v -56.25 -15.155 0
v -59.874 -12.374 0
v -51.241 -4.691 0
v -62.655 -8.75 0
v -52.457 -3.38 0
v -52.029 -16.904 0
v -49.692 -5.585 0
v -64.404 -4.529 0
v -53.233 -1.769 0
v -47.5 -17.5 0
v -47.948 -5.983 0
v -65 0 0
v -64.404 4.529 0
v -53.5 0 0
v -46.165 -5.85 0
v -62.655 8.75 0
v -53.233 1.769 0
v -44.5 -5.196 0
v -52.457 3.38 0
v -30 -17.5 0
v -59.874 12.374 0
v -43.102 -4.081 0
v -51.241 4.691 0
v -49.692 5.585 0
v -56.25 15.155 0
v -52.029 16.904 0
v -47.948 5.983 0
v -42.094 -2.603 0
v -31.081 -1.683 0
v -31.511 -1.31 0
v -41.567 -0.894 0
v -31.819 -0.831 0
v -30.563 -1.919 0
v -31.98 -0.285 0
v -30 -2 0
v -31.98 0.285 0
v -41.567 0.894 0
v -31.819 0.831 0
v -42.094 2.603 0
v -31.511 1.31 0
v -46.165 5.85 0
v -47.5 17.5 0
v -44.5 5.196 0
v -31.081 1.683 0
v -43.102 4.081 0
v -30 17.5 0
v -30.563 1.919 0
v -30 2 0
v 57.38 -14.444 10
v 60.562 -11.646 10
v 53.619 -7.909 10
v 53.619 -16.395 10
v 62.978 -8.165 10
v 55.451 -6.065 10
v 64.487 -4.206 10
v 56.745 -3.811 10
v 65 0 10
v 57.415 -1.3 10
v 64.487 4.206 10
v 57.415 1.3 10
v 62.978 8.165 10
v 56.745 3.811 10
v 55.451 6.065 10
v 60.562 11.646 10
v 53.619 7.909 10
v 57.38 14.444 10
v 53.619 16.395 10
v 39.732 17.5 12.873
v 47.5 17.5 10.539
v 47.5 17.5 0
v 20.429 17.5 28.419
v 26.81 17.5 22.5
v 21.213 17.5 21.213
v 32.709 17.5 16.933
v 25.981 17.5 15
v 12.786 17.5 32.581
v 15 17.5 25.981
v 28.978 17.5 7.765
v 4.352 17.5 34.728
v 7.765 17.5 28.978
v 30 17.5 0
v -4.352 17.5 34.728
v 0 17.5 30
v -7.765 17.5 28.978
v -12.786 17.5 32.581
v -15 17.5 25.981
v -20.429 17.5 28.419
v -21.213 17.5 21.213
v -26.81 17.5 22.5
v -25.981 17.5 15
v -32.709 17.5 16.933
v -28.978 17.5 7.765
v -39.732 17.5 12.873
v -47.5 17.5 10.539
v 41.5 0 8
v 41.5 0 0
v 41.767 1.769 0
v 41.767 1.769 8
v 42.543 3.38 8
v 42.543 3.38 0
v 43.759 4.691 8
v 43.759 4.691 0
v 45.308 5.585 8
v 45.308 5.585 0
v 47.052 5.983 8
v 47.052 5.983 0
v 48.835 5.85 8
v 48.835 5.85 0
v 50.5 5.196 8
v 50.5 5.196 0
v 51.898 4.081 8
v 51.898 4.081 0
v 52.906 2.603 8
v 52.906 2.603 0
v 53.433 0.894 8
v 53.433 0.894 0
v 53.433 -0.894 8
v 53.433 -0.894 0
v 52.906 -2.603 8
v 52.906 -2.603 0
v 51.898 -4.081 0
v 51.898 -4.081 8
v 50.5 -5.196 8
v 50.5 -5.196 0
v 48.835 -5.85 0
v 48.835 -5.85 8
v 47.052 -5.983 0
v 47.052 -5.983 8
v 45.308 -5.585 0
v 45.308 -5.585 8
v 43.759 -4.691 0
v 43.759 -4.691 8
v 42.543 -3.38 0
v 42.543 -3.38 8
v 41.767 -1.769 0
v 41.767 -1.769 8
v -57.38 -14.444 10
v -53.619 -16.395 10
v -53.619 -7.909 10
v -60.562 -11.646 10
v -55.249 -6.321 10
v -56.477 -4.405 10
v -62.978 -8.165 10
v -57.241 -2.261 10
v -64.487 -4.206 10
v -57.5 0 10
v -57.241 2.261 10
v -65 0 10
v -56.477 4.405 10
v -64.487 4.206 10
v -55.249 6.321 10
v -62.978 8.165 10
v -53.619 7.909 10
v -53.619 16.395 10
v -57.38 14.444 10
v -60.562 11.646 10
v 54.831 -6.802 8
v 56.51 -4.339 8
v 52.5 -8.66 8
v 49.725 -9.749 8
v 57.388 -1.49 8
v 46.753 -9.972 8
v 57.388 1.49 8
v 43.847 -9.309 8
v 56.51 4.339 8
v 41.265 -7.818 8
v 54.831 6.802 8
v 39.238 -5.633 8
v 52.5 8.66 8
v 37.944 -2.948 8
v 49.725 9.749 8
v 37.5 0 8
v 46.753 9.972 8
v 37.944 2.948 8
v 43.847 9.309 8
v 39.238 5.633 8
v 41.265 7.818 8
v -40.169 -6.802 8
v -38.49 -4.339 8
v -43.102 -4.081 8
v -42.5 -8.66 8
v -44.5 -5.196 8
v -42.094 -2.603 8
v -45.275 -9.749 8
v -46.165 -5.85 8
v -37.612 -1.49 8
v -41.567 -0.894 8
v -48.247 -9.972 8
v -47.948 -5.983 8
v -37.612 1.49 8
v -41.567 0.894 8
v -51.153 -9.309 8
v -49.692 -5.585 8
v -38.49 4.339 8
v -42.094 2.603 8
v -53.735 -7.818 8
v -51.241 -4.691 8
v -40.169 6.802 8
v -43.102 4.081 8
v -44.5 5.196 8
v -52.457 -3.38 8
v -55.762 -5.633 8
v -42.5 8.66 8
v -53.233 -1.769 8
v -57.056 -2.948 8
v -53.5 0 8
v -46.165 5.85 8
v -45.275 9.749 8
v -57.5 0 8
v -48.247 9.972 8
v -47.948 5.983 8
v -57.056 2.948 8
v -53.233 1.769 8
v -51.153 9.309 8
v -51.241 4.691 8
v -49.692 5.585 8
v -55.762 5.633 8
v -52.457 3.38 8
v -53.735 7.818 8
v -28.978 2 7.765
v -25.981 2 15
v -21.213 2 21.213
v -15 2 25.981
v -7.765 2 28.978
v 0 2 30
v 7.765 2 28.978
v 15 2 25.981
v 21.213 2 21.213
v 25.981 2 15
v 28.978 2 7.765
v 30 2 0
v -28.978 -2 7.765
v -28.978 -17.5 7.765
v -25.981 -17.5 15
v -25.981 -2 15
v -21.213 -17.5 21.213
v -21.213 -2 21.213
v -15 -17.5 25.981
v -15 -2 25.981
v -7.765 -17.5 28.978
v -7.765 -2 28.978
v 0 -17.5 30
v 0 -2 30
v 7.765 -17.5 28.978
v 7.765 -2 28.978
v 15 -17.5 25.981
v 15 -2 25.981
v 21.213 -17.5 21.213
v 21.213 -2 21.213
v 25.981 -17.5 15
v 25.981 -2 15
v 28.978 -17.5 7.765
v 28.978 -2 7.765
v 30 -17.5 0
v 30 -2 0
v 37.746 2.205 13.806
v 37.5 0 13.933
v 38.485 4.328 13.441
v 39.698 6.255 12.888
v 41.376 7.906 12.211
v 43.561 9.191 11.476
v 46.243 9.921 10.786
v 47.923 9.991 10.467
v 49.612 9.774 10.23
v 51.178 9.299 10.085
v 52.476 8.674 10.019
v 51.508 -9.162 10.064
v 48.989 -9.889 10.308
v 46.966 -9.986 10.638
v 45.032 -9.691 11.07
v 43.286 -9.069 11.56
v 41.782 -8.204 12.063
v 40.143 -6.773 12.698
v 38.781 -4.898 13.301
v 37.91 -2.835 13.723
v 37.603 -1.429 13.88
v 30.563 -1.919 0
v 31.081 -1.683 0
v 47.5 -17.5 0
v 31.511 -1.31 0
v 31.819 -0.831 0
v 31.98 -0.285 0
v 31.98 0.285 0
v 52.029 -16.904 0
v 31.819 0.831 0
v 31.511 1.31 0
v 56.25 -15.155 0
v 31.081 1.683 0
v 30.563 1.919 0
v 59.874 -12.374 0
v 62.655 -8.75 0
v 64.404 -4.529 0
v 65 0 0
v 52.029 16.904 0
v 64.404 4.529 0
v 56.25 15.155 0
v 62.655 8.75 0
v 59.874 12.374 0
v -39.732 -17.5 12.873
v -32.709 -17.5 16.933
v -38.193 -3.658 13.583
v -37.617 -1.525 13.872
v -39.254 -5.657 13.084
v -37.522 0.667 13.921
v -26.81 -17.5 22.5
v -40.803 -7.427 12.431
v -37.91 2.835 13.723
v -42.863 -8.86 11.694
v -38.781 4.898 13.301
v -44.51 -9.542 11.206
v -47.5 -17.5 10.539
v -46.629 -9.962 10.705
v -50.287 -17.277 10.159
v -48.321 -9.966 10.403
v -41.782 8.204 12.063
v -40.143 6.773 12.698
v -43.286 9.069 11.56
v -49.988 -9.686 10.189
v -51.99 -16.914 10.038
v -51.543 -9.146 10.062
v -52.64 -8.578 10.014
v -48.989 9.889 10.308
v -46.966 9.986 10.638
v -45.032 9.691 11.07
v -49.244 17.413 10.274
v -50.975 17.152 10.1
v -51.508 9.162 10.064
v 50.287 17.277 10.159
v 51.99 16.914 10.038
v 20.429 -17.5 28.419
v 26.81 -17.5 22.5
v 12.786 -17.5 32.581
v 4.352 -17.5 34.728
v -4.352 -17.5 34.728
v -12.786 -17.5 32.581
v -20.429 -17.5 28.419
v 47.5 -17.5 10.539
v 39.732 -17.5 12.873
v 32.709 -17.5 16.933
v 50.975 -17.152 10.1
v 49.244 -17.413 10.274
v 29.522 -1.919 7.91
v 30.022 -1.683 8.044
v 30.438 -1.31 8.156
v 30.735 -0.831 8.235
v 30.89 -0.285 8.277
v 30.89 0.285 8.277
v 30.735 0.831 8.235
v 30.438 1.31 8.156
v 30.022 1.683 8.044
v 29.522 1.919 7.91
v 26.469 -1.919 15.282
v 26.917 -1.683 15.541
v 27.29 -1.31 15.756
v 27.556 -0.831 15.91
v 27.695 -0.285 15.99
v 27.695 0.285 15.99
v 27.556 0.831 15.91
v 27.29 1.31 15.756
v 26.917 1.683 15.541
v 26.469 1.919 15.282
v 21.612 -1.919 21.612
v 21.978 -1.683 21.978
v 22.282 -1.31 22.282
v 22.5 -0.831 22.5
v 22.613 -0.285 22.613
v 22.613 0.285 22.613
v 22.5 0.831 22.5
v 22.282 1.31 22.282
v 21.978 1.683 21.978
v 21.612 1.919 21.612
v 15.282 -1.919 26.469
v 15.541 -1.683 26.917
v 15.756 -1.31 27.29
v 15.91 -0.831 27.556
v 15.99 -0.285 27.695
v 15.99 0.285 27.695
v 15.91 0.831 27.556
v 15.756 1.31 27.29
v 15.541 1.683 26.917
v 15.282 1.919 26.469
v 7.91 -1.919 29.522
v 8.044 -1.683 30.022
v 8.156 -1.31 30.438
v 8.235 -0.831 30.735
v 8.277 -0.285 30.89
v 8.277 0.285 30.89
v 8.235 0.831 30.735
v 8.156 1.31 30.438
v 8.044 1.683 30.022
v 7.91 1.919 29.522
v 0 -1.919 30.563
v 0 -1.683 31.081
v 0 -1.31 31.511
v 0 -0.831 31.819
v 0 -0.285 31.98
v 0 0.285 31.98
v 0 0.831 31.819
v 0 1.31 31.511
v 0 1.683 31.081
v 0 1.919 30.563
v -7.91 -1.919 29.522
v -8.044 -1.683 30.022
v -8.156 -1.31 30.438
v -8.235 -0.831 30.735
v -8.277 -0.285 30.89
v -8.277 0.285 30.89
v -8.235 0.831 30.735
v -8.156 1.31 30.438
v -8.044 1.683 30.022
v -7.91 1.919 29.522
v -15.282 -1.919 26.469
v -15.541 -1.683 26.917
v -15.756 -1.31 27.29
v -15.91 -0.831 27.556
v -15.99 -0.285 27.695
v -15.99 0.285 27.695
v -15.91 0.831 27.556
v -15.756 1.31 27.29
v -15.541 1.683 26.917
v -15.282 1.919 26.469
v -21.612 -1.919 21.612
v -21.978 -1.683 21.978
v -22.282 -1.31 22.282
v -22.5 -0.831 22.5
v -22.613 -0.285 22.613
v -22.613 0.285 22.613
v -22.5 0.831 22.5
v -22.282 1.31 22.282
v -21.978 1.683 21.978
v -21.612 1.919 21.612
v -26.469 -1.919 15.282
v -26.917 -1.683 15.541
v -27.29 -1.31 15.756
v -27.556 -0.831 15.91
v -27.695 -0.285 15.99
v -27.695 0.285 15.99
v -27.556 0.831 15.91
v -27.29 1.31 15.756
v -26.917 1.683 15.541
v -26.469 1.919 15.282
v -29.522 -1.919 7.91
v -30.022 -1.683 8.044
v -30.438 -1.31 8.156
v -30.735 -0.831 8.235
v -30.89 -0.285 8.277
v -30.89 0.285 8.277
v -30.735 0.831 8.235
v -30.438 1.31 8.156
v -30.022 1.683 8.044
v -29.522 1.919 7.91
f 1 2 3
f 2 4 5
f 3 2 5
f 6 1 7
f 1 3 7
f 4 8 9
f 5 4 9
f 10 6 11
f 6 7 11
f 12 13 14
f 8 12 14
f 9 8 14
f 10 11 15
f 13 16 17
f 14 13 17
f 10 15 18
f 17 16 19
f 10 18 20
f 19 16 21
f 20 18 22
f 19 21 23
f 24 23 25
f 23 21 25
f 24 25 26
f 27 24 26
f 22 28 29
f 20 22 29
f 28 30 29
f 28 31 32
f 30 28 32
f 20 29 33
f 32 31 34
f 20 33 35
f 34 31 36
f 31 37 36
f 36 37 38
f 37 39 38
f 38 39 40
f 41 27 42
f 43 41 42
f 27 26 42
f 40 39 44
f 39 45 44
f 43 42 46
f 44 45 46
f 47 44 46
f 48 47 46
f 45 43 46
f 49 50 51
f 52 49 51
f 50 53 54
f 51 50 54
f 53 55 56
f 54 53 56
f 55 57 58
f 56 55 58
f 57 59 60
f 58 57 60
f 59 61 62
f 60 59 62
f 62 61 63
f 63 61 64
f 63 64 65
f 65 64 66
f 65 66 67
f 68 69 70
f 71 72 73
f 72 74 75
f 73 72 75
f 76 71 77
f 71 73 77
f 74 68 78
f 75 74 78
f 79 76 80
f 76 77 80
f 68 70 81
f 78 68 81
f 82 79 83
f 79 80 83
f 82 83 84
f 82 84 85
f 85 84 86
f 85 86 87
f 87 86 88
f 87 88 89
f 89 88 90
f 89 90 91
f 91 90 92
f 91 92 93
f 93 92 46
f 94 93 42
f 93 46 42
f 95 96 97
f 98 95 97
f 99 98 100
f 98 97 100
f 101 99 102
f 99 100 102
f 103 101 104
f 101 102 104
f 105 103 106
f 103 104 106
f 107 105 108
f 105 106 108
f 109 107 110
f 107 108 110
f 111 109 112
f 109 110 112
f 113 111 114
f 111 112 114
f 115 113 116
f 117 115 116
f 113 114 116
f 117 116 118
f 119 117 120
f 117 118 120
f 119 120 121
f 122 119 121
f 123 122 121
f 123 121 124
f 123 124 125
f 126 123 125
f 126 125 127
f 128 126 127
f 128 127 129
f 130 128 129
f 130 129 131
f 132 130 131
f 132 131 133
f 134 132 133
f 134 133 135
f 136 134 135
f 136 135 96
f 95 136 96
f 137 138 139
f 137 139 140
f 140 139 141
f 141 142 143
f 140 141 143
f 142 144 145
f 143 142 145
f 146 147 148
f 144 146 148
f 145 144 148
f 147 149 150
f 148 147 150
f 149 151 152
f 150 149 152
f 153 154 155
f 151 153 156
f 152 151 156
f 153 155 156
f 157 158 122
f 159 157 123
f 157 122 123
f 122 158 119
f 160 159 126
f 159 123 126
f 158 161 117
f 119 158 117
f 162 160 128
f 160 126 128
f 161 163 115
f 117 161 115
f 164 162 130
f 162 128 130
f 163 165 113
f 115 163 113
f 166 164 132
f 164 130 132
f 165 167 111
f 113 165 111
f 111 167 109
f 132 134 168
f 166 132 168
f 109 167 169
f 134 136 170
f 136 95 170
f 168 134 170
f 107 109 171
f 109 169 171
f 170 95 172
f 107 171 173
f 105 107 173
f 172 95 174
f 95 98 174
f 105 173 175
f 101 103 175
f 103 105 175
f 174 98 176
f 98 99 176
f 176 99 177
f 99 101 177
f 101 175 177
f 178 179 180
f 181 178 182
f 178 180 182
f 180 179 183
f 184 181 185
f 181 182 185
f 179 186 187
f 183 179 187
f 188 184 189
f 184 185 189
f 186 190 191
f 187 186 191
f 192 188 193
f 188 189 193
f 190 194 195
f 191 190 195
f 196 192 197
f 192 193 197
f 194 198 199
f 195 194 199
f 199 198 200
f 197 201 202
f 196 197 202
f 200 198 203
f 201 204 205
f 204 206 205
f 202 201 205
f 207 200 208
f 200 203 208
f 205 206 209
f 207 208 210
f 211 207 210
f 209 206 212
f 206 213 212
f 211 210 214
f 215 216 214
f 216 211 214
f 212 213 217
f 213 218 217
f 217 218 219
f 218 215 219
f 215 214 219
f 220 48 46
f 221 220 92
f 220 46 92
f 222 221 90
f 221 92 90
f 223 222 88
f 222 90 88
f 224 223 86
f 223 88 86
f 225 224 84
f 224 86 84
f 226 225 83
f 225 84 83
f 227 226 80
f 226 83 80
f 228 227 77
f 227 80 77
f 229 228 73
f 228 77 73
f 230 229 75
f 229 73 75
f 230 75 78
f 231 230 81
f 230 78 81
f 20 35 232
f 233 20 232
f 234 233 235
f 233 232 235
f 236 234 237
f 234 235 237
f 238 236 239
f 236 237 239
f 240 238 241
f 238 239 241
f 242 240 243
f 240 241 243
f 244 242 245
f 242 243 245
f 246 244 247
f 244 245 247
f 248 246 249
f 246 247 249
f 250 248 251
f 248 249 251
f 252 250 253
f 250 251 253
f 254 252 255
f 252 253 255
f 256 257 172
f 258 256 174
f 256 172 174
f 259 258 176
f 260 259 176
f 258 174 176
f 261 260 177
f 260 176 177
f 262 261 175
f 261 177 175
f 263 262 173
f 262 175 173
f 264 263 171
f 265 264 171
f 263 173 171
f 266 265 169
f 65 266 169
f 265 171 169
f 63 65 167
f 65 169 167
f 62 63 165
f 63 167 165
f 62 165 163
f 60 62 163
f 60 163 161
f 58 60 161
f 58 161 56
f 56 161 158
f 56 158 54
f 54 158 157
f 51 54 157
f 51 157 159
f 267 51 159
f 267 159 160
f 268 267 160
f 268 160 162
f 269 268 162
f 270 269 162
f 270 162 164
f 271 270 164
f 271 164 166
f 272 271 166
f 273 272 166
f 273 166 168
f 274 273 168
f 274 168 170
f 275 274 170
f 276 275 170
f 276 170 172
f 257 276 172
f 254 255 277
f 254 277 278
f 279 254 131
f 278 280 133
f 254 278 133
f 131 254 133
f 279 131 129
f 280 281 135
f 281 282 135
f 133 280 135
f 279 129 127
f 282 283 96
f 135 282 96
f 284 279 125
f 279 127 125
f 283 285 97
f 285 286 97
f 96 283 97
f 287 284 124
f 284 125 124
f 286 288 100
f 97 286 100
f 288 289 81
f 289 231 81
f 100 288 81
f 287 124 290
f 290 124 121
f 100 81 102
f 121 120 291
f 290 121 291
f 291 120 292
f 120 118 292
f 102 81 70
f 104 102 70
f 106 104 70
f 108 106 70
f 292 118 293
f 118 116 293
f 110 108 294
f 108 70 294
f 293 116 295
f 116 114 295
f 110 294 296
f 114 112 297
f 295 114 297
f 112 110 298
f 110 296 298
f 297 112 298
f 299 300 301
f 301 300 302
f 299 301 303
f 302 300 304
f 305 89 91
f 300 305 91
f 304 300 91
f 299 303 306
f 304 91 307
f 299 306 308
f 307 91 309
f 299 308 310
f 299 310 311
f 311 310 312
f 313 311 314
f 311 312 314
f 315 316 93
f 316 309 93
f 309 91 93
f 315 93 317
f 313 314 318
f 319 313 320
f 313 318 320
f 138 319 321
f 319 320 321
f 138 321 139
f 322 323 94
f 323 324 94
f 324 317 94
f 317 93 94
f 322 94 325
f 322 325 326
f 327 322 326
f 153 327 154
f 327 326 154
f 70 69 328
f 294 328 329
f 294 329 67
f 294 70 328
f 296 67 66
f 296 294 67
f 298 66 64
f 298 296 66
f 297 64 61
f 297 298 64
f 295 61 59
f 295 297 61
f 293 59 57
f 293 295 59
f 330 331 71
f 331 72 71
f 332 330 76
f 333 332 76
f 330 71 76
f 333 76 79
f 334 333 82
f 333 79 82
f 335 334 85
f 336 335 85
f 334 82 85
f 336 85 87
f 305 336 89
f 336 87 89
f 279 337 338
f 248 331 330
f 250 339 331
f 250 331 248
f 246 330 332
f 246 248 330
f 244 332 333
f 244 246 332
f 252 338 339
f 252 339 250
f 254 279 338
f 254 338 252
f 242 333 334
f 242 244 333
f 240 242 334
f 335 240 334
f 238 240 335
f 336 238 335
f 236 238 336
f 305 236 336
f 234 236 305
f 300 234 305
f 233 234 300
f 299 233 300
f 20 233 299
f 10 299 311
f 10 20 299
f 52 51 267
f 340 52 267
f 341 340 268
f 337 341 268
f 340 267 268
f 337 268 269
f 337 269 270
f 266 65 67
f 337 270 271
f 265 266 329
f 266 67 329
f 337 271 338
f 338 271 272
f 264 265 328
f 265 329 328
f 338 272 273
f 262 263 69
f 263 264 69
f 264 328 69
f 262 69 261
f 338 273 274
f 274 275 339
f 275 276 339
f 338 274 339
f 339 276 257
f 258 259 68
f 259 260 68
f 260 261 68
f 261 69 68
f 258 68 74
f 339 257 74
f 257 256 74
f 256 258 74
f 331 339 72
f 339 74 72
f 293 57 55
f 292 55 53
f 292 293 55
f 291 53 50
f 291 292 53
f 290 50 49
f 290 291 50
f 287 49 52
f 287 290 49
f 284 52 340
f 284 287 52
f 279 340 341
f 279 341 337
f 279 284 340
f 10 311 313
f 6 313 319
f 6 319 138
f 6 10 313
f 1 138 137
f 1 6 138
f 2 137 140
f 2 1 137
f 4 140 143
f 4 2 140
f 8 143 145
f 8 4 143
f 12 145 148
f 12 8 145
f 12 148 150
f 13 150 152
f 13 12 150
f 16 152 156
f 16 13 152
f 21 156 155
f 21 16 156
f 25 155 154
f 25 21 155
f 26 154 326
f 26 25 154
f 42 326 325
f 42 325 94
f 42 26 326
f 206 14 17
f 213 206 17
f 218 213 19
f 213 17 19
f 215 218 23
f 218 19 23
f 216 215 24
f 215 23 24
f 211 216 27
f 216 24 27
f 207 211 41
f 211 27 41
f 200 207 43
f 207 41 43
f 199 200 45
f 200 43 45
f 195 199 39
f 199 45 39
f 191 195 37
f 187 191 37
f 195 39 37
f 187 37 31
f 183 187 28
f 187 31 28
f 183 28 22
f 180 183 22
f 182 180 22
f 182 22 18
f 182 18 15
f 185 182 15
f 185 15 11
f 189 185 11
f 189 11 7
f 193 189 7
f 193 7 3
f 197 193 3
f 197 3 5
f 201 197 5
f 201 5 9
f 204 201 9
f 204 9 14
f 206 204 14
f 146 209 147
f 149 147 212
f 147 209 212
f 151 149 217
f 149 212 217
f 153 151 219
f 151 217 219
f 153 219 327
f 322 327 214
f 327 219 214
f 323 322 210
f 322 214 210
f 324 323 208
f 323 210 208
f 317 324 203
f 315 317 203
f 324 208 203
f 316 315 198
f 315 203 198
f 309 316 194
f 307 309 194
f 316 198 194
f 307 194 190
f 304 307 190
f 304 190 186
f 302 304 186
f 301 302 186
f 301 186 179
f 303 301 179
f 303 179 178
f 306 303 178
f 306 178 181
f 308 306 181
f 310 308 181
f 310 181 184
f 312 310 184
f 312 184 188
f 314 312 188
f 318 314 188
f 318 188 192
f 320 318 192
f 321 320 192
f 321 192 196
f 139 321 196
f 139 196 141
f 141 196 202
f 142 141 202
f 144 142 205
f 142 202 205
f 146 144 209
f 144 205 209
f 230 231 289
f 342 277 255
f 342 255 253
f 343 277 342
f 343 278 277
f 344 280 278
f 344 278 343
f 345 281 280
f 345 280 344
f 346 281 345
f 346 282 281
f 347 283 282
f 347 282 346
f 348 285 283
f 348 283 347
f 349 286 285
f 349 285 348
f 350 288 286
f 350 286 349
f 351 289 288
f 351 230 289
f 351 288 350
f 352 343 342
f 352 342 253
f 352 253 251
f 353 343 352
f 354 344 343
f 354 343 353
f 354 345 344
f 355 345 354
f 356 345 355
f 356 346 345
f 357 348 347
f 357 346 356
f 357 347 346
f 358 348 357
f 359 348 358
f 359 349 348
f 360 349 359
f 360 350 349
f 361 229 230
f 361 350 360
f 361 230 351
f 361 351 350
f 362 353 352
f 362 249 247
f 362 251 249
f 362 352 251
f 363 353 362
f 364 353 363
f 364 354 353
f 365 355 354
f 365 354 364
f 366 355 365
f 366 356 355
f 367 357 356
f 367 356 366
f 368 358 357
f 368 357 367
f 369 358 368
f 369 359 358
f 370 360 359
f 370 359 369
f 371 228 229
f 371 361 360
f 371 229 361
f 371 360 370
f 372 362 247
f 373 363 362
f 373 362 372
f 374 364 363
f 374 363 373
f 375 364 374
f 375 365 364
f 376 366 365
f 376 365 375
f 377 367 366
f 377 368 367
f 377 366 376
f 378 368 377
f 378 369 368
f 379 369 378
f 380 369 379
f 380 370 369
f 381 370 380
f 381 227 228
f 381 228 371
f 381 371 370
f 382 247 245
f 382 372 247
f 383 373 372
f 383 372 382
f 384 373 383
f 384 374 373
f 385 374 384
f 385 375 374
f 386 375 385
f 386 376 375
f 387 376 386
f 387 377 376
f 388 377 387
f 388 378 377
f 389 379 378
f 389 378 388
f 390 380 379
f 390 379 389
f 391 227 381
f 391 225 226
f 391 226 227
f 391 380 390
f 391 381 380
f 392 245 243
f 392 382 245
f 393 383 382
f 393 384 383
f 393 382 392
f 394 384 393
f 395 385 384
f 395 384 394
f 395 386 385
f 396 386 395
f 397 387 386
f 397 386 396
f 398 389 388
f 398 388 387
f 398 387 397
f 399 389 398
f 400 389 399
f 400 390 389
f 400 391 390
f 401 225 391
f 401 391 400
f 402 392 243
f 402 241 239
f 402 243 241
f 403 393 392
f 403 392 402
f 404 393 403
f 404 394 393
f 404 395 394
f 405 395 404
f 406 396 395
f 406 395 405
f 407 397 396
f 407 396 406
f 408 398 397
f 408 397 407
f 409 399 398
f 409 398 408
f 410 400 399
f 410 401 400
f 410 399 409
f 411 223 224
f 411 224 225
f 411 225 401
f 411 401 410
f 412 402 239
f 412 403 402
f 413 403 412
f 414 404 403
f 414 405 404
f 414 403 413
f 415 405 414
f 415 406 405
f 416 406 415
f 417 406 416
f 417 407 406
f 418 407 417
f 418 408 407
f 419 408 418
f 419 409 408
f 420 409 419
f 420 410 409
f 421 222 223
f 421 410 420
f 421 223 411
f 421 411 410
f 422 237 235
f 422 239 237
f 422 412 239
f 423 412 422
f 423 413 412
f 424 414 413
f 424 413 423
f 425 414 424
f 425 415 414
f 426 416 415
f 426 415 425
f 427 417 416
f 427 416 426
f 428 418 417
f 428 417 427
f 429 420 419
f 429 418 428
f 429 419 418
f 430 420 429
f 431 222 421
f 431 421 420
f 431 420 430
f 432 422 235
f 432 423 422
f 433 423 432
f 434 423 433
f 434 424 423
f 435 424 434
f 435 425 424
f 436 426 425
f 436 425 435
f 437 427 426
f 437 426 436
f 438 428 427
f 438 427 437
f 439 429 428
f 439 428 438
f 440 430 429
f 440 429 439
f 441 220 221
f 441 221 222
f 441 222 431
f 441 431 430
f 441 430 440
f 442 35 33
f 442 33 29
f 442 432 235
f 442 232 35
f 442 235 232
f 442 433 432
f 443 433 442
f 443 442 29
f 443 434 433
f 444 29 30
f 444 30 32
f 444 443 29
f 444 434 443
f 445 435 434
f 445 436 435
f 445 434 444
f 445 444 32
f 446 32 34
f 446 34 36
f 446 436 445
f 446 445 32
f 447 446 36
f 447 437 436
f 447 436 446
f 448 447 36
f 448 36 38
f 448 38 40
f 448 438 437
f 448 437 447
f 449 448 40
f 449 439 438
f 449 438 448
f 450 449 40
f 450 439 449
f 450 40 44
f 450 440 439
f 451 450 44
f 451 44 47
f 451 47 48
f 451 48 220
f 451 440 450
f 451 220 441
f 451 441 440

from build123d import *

# Parameters (mm, degrees)
BOSS_EXTRUDE1_DEPTH = 17.5
SKETCH2_R           = 6
CUT_EXTRUDE1_DEPTH  = 35
SKETCH3_R           = 2
FILLET1_DEPTH       = 35
FILLET2_DEPTH       = 35
CUT_EXTRUDE2_START  = -8
SKETCH4_R           = 10
CUT_EXTRUDE2_DEPTH  = 35


with BuildPart() as part:
    # Sketch1 → Boss-Extrude1 (new, symmetric)
    with BuildSketch(Plane(origin=(0, 0, 0), x_dir=(1, 0, 0), z_dir=(0, 1, 0))):
        with BuildLine():
            Line((30, 0), (65, 0))
            Line((65, 0), (65, -10))
            Line((65, -10), (53.619026474, -10))
            ThreePointArc((53.619026474, -10), (38.828827016, -13.278556149), (26.809513237, -22.5))
            ThreePointArc((26.809513237, -22.5), (0, -35), (-26.809513237, -22.5))
            ThreePointArc((-26.809513237, -22.5), (-38.828827016, -13.278556149), (-53.619026474, -10))
            Line((-53.619026474, -10), (-65, -10))
            Line((-65, -10), (-65, 0))
            Line((-65, 0), (-30, 0))
            ThreePointArc((-30, 0), (0, -30), (30, 0))
        make_face()
    extrude(amount=BOSS_EXTRUDE1_DEPTH, both=True)

    # Sketch2 → Cut-Extrude1 (cut)
    with BuildSketch(Plane(origin=(0, 0, 0), x_dir=(-1, 0, 0), z_dir=(0, 0, -1))):
        with Locations((47.5, 0)):
            Circle(SKETCH2_R)
        with Locations((-47.5, 0)):
            Circle(SKETCH2_R)
    extrude(amount=-CUT_EXTRUDE1_DEPTH, mode=Mode.SUBTRACT)

    # Sketch3 → Cut-Revolve1 (revolve, cut)
    with BuildSketch(Plane(origin=(0, 0, 0), x_dir=(-1, 0, 0), z_dir=(0, 0, -1))):
        with Locations((30, 0)):
            Circle(SKETCH3_R)
    revolve(axis=Axis((0, 17.5, 0), (0, -1, 0)), mode=Mode.SUBTRACT)

    # Fillet1: read off the stored shape, not the designer's step
    # Fillet1 outline → Fillet1 (cut)
    with BuildSketch(Plane.XY):
        with BuildLine():
            Line((65, 17.5), (47.5, 17.5))
            ThreePointArc((47.5, 17.5), (59.87436864, 12.374368701), (65, 8.6e-08))
            Line((65, 8.6e-08), (65, 17.5))
        make_face()
        with BuildLine():
            Line((65, -17.5), (65, 8.6e-08))
            ThreePointArc((65, 8.6e-08), (59.874368701, -12.374368641), (47.499999999, -17.5))
            Line((47.499999999, -17.5), (65, -17.5))
        make_face()
    extrude(amount=FILLET1_DEPTH, mode=Mode.SUBTRACT)

    # Fillet2: read off the stored shape, not the designer's step
    # Fillet2 outline → Fillet2 (cut)
    with BuildSketch(Plane.XY):
        with BuildLine():
            ThreePointArc((-47.5, -17.5), (-59.874368677, -12.374368665), (-65, 1.8e-08))
            Line((-65, 1.8e-08), (-65, -17.5))
            Line((-65, -17.5), (-47.5, -17.5))
        make_face()
        with BuildLine():
            ThreePointArc((-65, 1.8e-08), (-59.874368665, 12.374368677), (-47.5, 17.5))
            Line((-47.5, 17.5), (-65, 17.5))
            Line((-65, 17.5), (-65, 1.8e-08))
        make_face()
    extrude(amount=FILLET2_DEPTH, mode=Mode.SUBTRACT)

    # Sketch4 → Cut-Extrude2 (cut)
    with BuildSketch(Plane(origin=(0, 0, 0), x_dir=(-1, 0, 0), z_dir=(0, 0, -1)).offset(CUT_EXTRUDE2_START)):
        with Locations((-47.5, 0)):
            Circle(SKETCH4_R)
        with Locations((47.5, 0)):
            Circle(SKETCH4_R)
    extrude(amount=-CUT_EXTRUDE2_DEPTH, mode=Mode.SUBTRACT)


solid = part.part
